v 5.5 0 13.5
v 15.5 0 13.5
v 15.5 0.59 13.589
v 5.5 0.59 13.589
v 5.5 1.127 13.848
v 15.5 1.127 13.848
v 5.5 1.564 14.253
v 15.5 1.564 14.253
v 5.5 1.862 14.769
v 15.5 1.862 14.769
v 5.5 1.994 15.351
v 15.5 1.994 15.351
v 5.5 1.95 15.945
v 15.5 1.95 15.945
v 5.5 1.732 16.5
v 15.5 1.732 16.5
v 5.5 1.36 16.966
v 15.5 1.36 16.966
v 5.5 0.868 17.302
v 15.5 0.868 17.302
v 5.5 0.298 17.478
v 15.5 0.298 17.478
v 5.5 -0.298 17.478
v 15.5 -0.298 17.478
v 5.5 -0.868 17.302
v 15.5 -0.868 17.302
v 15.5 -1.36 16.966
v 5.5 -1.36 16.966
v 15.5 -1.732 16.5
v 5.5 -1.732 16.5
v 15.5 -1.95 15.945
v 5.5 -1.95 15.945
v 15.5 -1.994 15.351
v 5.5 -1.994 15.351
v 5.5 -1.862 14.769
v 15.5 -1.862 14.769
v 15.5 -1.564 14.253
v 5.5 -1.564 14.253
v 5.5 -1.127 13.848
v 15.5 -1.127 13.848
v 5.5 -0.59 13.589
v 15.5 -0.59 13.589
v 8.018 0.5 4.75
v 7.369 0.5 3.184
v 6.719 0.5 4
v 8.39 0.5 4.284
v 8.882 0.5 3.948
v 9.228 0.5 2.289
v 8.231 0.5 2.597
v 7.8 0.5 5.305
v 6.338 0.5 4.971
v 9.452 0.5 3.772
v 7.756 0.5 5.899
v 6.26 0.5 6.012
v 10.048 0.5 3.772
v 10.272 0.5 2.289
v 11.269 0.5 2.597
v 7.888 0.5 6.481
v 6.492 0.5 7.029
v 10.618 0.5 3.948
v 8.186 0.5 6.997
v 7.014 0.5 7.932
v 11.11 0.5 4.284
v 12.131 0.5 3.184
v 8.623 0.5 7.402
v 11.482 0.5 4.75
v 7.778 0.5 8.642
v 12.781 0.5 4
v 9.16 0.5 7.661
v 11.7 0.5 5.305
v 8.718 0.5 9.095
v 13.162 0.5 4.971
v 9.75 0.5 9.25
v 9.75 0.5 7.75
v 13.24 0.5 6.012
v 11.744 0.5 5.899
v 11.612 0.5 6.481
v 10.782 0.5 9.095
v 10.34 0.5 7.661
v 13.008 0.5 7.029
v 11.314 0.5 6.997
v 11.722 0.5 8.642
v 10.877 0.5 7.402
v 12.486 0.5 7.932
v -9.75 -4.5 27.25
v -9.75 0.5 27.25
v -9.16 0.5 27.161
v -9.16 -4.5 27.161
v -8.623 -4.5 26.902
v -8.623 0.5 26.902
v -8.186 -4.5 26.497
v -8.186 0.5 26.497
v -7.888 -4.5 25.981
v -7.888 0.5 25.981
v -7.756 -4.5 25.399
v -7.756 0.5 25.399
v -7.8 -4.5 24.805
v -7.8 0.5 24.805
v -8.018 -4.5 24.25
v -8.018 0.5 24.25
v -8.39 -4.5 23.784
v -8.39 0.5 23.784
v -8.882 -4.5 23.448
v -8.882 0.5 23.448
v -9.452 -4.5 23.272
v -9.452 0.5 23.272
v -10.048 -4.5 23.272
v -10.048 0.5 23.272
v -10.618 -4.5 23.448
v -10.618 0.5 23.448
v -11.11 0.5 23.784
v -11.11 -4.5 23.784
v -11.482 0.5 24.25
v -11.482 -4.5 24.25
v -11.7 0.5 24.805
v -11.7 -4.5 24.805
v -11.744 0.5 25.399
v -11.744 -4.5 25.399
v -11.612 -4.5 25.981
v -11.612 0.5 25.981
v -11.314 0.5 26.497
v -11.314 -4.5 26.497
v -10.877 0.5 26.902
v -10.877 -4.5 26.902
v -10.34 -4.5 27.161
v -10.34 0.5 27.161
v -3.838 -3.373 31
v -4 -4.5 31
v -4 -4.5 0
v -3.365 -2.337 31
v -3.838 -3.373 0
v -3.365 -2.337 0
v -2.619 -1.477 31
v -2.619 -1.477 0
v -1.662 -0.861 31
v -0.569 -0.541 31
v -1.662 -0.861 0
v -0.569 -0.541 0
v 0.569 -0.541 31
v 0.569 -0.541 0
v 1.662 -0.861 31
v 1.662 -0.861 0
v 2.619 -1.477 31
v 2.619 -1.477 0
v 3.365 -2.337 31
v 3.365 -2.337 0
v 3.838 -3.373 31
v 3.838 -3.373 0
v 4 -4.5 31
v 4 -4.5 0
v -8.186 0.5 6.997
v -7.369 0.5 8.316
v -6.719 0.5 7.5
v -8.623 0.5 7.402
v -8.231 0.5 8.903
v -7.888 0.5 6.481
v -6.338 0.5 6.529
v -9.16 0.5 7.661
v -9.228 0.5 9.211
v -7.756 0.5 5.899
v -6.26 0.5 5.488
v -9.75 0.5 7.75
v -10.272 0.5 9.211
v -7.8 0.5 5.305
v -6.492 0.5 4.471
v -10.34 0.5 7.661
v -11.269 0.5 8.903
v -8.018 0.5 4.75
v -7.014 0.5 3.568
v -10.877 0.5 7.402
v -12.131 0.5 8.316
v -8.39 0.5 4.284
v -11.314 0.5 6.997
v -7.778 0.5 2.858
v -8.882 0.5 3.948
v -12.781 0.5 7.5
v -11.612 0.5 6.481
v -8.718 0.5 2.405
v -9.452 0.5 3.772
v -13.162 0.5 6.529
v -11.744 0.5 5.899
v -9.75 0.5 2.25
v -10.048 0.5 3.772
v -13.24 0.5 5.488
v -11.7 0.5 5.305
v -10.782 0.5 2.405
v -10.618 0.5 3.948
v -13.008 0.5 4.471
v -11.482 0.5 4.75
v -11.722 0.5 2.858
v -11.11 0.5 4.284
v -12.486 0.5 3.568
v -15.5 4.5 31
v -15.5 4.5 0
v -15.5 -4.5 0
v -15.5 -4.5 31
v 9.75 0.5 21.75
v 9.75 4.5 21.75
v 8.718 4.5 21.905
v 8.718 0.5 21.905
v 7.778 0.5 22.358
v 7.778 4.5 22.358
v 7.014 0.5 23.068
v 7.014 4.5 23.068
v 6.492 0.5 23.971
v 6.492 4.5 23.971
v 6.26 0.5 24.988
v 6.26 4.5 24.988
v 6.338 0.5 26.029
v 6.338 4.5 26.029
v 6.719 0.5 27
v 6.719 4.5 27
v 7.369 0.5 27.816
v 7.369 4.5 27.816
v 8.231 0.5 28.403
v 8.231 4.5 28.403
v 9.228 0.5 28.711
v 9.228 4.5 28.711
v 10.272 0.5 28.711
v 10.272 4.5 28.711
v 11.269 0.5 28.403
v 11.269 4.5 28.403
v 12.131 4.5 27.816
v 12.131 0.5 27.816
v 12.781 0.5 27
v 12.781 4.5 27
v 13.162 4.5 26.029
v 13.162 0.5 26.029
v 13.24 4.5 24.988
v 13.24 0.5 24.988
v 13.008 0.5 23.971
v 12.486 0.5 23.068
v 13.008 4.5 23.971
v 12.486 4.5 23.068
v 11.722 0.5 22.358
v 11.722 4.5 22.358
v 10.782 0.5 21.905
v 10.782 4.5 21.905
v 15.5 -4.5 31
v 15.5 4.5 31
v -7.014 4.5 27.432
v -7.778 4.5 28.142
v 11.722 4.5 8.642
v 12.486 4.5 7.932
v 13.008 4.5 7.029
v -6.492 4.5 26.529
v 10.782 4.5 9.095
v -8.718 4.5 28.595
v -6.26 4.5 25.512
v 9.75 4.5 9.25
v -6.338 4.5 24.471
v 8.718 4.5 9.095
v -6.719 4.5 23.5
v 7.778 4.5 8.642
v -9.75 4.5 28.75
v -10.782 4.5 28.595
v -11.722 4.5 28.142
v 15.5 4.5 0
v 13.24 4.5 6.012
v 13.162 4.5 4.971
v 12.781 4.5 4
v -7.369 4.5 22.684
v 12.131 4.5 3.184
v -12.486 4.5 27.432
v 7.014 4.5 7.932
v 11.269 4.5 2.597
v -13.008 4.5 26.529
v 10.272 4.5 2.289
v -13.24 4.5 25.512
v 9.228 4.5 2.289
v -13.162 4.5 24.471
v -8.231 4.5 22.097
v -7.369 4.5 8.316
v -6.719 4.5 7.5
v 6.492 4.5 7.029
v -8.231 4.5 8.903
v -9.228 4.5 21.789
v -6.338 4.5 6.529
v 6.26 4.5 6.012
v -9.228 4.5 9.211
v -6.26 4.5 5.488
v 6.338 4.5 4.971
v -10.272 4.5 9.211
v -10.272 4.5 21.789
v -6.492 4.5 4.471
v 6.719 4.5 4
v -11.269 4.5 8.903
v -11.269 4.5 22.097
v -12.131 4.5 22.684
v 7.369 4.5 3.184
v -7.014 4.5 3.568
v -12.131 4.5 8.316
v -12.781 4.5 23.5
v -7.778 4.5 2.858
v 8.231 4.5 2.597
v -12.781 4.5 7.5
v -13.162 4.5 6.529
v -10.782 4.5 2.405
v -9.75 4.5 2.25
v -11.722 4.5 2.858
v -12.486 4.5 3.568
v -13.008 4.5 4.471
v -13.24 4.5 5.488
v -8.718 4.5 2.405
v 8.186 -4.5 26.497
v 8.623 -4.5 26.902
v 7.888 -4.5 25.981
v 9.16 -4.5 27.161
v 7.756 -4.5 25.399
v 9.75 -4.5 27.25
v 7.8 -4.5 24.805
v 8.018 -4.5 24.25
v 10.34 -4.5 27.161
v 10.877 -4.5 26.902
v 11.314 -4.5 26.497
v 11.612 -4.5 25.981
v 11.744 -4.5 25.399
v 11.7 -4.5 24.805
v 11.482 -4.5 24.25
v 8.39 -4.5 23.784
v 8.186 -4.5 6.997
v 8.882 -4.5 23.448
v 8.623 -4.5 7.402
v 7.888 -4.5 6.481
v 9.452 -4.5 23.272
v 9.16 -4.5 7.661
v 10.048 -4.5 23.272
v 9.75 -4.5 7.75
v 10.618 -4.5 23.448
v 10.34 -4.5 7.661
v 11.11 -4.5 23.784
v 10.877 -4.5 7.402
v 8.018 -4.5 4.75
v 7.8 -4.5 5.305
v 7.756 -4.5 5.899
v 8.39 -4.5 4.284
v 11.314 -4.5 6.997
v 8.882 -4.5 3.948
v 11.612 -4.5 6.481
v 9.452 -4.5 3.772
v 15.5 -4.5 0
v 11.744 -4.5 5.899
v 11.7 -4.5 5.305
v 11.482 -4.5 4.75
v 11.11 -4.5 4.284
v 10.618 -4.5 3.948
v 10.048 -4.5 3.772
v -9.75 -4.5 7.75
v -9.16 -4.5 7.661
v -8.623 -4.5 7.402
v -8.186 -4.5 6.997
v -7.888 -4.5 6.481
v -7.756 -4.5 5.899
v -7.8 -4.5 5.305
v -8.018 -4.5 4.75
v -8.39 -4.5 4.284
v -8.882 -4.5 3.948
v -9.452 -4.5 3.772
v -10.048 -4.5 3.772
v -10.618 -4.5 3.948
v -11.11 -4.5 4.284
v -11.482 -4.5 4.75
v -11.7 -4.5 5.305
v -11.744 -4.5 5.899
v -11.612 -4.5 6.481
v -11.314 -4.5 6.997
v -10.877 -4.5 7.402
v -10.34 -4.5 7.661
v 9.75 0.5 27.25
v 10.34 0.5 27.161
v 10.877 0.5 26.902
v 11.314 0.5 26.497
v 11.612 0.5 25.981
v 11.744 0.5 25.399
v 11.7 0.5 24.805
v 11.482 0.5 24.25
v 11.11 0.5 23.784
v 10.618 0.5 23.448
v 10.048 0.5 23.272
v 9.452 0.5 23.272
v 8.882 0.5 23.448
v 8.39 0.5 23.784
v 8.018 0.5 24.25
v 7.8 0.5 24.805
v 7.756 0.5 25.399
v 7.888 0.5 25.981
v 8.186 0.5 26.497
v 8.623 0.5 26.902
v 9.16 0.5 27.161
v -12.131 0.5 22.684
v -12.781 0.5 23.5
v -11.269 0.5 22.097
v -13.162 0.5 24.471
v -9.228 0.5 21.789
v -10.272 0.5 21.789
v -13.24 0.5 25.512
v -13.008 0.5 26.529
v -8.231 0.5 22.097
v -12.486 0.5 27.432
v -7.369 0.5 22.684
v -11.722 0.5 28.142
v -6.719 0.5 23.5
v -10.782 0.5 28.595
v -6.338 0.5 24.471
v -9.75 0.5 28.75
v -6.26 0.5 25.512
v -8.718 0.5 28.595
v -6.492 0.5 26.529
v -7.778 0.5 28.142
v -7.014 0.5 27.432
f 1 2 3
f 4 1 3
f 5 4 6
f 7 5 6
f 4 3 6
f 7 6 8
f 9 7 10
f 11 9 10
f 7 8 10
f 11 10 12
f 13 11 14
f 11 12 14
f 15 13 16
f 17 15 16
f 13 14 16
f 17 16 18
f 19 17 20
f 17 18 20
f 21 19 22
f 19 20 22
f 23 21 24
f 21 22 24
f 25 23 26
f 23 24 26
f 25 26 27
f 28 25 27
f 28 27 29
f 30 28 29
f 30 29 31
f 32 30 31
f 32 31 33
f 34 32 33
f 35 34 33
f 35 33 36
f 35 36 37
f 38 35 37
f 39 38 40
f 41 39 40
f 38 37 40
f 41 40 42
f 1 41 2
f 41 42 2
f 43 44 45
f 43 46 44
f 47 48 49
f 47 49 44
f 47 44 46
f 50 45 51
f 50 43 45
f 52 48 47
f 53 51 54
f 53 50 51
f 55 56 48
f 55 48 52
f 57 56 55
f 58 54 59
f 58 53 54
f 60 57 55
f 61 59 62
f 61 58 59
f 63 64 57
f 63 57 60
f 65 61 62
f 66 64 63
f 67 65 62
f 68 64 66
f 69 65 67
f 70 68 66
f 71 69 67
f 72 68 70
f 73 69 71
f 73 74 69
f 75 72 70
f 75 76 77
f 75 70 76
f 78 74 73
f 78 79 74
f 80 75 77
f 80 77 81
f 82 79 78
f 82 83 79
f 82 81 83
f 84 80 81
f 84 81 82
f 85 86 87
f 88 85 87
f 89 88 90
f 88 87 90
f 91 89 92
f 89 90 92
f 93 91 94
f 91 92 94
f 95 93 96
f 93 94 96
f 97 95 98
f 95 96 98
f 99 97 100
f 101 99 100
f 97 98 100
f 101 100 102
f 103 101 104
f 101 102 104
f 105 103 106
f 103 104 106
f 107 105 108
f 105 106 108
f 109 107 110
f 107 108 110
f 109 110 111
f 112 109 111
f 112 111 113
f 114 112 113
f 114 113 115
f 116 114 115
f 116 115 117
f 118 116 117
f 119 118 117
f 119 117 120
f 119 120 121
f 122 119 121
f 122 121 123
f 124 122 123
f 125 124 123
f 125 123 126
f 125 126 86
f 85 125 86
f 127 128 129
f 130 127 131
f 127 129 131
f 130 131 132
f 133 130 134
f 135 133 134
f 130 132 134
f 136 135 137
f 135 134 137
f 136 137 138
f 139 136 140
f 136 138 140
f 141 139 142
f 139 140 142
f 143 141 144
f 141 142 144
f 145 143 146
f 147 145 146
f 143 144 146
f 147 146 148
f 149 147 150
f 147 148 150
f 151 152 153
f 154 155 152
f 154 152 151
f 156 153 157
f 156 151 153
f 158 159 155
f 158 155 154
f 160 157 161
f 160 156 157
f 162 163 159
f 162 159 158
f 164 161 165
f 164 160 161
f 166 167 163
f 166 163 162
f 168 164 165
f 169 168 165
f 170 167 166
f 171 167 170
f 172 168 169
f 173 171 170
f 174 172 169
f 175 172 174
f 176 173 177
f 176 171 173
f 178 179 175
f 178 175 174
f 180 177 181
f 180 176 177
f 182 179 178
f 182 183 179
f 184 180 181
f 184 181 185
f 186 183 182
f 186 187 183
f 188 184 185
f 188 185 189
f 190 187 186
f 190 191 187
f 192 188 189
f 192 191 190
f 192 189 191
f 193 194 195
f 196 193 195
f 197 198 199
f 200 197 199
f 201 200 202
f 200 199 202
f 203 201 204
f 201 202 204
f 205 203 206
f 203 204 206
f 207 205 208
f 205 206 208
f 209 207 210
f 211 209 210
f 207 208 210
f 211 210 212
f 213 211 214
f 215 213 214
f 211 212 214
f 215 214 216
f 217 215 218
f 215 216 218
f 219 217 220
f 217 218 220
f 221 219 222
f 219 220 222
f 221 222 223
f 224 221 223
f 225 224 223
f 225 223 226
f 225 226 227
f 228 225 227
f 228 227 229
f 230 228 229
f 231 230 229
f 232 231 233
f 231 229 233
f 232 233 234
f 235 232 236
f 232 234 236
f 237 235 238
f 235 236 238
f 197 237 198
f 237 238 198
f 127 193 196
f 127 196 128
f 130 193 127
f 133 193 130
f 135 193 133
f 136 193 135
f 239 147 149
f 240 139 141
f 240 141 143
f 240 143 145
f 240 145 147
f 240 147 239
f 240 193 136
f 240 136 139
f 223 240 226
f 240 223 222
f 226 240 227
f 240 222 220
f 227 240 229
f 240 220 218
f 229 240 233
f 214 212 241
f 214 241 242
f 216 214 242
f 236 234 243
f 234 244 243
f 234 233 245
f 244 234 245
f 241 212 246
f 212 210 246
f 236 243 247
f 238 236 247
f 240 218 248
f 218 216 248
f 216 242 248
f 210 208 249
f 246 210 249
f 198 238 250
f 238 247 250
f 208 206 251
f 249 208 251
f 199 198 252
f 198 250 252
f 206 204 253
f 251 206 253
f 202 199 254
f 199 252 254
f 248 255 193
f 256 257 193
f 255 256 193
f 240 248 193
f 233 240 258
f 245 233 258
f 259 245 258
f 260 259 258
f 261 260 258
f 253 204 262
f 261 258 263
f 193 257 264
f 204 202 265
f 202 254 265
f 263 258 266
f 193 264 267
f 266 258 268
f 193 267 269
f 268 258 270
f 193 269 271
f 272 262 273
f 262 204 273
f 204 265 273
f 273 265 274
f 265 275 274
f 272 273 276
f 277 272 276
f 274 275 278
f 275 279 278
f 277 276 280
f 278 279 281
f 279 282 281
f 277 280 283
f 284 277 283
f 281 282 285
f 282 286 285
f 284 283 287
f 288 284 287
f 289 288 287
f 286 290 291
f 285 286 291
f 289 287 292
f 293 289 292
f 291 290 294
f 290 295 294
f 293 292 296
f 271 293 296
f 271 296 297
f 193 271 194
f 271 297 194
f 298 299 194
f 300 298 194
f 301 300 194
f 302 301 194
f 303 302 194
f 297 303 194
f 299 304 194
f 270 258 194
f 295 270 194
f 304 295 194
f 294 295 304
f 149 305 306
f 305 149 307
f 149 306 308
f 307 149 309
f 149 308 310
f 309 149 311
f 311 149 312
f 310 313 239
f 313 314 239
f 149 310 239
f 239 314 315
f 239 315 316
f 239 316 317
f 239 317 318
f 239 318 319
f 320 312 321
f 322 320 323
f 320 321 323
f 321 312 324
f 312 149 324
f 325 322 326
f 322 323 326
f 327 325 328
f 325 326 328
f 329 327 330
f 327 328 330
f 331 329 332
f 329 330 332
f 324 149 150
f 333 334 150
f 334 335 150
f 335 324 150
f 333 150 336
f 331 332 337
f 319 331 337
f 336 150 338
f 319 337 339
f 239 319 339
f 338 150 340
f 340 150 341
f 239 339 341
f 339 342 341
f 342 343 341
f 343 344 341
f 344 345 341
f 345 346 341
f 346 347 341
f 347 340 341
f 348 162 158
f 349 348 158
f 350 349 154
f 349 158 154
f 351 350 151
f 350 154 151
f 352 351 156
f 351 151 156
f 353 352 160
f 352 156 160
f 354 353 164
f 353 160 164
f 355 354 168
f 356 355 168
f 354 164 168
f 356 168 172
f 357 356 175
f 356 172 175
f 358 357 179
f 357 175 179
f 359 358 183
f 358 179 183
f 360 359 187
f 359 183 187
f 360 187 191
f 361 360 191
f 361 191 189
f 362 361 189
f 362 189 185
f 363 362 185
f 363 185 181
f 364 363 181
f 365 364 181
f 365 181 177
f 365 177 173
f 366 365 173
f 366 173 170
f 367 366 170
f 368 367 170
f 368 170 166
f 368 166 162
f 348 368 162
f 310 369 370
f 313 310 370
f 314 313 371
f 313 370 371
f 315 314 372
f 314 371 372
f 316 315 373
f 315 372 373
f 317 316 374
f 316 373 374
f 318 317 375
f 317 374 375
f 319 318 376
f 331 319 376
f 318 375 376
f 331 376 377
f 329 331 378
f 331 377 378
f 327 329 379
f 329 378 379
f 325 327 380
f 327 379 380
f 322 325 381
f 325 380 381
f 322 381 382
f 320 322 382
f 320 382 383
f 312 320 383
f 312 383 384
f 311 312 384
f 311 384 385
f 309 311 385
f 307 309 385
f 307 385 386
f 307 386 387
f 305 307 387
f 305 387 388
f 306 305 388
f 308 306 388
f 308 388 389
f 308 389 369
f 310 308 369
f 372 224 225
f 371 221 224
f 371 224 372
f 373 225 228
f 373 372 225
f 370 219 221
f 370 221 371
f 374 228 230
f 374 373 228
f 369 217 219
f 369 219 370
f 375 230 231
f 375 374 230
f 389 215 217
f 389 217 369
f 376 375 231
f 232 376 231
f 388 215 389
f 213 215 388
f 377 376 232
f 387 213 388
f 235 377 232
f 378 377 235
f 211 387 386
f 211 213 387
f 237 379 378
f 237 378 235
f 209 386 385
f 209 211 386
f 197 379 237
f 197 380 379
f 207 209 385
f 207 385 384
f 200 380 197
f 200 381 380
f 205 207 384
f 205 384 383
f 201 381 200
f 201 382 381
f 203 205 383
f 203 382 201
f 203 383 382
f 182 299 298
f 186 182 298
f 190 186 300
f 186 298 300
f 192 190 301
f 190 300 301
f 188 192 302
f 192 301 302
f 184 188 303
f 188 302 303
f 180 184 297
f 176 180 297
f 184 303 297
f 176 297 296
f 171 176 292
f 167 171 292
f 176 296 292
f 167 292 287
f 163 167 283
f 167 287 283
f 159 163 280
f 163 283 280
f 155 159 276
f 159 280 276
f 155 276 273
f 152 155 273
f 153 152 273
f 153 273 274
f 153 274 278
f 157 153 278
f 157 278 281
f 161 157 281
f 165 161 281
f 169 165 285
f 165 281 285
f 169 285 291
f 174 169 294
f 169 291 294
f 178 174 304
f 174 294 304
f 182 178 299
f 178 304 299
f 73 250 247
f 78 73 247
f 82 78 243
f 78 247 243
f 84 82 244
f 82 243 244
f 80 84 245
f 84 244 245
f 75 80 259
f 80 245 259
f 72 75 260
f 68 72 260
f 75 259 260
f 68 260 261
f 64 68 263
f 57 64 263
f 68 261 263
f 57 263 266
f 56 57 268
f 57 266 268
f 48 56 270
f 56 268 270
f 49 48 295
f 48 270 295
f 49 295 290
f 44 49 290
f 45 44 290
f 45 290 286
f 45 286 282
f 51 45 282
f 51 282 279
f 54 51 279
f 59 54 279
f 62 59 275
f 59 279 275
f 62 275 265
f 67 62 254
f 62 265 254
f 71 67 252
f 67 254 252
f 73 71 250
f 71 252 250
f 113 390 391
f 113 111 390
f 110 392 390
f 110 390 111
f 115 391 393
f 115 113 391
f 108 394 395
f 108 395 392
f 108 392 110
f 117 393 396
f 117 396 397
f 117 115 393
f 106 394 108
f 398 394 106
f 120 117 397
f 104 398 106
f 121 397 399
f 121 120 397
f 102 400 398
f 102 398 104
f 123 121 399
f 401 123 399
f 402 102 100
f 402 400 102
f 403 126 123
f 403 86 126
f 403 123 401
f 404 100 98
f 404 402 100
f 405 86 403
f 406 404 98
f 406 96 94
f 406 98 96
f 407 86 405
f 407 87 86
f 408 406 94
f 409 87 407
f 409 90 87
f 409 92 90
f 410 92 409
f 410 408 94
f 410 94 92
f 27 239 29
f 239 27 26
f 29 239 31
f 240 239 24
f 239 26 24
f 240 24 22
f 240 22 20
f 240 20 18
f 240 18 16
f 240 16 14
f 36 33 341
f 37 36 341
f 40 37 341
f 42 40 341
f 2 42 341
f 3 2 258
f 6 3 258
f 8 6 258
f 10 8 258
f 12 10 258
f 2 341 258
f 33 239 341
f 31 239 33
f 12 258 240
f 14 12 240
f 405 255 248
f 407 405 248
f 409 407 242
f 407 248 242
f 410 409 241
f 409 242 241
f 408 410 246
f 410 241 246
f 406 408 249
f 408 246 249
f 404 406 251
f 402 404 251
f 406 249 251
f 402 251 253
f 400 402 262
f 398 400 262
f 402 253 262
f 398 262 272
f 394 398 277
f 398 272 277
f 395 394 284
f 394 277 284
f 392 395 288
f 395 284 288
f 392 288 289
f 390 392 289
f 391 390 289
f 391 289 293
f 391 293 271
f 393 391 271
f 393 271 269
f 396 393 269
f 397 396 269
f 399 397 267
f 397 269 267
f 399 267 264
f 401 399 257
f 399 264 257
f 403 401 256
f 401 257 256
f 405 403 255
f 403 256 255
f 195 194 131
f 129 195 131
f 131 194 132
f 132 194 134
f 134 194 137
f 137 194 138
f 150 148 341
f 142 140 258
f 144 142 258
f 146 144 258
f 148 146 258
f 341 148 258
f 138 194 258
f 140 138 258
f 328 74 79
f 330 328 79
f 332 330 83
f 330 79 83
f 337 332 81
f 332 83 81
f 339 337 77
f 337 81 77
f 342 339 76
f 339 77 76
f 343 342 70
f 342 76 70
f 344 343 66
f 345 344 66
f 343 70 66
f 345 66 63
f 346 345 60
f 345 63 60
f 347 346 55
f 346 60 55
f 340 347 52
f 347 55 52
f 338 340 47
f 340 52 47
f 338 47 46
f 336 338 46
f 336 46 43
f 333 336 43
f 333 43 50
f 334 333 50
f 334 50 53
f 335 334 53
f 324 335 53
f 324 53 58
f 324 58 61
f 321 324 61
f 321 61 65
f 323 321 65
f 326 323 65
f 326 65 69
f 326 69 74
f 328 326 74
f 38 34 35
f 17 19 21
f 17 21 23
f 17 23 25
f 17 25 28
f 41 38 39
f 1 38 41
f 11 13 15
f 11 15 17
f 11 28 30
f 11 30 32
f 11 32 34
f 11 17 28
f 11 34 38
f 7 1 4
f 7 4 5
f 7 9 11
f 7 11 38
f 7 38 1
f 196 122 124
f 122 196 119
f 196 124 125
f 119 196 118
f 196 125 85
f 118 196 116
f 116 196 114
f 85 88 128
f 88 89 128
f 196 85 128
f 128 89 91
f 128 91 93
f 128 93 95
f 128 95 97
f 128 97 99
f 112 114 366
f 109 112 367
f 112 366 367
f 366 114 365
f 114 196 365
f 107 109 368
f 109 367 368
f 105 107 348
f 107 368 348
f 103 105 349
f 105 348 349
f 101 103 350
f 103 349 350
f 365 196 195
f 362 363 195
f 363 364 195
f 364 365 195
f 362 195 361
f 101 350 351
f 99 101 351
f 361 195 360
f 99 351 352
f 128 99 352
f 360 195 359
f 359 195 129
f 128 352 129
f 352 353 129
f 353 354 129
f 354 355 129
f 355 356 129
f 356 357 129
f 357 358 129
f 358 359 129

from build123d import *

# Parameters (mm, degrees)
P_IDAT_VYSUNUT_M1_DEPTH  = 31
SKICA3_R                 = 3.5
ODEBRAT_VYSUNUT_M1_DEPTH = 4
SKICA4_R                 = 2
ODEBRAT_VYSUNUT_M2_DEPTH = 36.80851854
SKICA5_R                 = 2
ODEBRAT_VYSUNUT_M3_DEPTH = 10


with BuildPart() as part:
    # Skica2 → Přidat vysunutím1 (new body)
    with BuildSketch(Plane.XY):
        with BuildLine():
            Line((15.5, -4.5), (15.5, 4.5))
            Line((15.5, 4.5), (-15.5, 4.5))
            Line((-15.5, 4.5), (-15.5, -4.5))
            Line((-15.5, -4.5), (-4, -4.5))
            ThreePointArc((-4, -4.5), (0, -0.5), (4, -4.5))
            Line((4, -4.5), (15.5, -4.5))
        make_face()
    extrude(amount=P_IDAT_VYSUNUT_M1_DEPTH)

    # Skica3 → Odebrat vysunutím1 (cut)
    with BuildSketch(Plane(origin=(0, 4.5, 0), x_dir=(1, 0, 0), z_dir=(0, 1, 0))):
        with Locations(Location((9.75, -5.75, 0), (0, 0, 270))):
            Circle(SKICA3_R)
        with Locations(Location((9.75, -25.25, 0), (0, 0, 90))):
            Circle(SKICA3_R)
        with Locations(Location((-9.75, -5.75, 0), (0, 0, 90))):
            Circle(SKICA3_R)
        with Locations(Location((-9.75, -25.25, 0), (0, 0, 270))):
            Circle(SKICA3_R)
    extrude(amount=-ODEBRAT_VYSUNUT_M1_DEPTH, mode=Mode.SUBTRACT)

    # Skica4 → Odebrat vysunutím2 (cut, through all)
    with BuildSketch(Plane(origin=(0, 4.5, 0), x_dir=(1, 0, 0), z_dir=(0, 1, 0))):
        with Locations(Location((9.75, -5.75, 0), (0, 0, 270))):
            Circle(SKICA4_R)
        with Locations(Location((-9.75, -5.75, 0), (0, 0, 270))):
            Circle(SKICA4_R)
        with Locations(Location((-9.75, -25.25, 0), (0, 0, 270))):
            Circle(SKICA4_R)
        with Locations(Location((9.75, -25.25, 0), (0, 0, 270))):
            Circle(SKICA4_R)
    extrude(amount=-ODEBRAT_VYSUNUT_M2_DEPTH, mode=Mode.SUBTRACT)

    # Skica5 → Odebrat vysunutím3 (cut)
    with BuildSketch(Plane(origin=(15.5, 0, 0), x_dir=(0, 0, -1), z_dir=(1, 0, 0))):
        with Locations((-15.5, 0)):
            Circle(SKICA5_R)
    extrude(amount=-ODEBRAT_VYSUNUT_M3_DEPTH, mode=Mode.SUBTRACT)


solid = part.part
